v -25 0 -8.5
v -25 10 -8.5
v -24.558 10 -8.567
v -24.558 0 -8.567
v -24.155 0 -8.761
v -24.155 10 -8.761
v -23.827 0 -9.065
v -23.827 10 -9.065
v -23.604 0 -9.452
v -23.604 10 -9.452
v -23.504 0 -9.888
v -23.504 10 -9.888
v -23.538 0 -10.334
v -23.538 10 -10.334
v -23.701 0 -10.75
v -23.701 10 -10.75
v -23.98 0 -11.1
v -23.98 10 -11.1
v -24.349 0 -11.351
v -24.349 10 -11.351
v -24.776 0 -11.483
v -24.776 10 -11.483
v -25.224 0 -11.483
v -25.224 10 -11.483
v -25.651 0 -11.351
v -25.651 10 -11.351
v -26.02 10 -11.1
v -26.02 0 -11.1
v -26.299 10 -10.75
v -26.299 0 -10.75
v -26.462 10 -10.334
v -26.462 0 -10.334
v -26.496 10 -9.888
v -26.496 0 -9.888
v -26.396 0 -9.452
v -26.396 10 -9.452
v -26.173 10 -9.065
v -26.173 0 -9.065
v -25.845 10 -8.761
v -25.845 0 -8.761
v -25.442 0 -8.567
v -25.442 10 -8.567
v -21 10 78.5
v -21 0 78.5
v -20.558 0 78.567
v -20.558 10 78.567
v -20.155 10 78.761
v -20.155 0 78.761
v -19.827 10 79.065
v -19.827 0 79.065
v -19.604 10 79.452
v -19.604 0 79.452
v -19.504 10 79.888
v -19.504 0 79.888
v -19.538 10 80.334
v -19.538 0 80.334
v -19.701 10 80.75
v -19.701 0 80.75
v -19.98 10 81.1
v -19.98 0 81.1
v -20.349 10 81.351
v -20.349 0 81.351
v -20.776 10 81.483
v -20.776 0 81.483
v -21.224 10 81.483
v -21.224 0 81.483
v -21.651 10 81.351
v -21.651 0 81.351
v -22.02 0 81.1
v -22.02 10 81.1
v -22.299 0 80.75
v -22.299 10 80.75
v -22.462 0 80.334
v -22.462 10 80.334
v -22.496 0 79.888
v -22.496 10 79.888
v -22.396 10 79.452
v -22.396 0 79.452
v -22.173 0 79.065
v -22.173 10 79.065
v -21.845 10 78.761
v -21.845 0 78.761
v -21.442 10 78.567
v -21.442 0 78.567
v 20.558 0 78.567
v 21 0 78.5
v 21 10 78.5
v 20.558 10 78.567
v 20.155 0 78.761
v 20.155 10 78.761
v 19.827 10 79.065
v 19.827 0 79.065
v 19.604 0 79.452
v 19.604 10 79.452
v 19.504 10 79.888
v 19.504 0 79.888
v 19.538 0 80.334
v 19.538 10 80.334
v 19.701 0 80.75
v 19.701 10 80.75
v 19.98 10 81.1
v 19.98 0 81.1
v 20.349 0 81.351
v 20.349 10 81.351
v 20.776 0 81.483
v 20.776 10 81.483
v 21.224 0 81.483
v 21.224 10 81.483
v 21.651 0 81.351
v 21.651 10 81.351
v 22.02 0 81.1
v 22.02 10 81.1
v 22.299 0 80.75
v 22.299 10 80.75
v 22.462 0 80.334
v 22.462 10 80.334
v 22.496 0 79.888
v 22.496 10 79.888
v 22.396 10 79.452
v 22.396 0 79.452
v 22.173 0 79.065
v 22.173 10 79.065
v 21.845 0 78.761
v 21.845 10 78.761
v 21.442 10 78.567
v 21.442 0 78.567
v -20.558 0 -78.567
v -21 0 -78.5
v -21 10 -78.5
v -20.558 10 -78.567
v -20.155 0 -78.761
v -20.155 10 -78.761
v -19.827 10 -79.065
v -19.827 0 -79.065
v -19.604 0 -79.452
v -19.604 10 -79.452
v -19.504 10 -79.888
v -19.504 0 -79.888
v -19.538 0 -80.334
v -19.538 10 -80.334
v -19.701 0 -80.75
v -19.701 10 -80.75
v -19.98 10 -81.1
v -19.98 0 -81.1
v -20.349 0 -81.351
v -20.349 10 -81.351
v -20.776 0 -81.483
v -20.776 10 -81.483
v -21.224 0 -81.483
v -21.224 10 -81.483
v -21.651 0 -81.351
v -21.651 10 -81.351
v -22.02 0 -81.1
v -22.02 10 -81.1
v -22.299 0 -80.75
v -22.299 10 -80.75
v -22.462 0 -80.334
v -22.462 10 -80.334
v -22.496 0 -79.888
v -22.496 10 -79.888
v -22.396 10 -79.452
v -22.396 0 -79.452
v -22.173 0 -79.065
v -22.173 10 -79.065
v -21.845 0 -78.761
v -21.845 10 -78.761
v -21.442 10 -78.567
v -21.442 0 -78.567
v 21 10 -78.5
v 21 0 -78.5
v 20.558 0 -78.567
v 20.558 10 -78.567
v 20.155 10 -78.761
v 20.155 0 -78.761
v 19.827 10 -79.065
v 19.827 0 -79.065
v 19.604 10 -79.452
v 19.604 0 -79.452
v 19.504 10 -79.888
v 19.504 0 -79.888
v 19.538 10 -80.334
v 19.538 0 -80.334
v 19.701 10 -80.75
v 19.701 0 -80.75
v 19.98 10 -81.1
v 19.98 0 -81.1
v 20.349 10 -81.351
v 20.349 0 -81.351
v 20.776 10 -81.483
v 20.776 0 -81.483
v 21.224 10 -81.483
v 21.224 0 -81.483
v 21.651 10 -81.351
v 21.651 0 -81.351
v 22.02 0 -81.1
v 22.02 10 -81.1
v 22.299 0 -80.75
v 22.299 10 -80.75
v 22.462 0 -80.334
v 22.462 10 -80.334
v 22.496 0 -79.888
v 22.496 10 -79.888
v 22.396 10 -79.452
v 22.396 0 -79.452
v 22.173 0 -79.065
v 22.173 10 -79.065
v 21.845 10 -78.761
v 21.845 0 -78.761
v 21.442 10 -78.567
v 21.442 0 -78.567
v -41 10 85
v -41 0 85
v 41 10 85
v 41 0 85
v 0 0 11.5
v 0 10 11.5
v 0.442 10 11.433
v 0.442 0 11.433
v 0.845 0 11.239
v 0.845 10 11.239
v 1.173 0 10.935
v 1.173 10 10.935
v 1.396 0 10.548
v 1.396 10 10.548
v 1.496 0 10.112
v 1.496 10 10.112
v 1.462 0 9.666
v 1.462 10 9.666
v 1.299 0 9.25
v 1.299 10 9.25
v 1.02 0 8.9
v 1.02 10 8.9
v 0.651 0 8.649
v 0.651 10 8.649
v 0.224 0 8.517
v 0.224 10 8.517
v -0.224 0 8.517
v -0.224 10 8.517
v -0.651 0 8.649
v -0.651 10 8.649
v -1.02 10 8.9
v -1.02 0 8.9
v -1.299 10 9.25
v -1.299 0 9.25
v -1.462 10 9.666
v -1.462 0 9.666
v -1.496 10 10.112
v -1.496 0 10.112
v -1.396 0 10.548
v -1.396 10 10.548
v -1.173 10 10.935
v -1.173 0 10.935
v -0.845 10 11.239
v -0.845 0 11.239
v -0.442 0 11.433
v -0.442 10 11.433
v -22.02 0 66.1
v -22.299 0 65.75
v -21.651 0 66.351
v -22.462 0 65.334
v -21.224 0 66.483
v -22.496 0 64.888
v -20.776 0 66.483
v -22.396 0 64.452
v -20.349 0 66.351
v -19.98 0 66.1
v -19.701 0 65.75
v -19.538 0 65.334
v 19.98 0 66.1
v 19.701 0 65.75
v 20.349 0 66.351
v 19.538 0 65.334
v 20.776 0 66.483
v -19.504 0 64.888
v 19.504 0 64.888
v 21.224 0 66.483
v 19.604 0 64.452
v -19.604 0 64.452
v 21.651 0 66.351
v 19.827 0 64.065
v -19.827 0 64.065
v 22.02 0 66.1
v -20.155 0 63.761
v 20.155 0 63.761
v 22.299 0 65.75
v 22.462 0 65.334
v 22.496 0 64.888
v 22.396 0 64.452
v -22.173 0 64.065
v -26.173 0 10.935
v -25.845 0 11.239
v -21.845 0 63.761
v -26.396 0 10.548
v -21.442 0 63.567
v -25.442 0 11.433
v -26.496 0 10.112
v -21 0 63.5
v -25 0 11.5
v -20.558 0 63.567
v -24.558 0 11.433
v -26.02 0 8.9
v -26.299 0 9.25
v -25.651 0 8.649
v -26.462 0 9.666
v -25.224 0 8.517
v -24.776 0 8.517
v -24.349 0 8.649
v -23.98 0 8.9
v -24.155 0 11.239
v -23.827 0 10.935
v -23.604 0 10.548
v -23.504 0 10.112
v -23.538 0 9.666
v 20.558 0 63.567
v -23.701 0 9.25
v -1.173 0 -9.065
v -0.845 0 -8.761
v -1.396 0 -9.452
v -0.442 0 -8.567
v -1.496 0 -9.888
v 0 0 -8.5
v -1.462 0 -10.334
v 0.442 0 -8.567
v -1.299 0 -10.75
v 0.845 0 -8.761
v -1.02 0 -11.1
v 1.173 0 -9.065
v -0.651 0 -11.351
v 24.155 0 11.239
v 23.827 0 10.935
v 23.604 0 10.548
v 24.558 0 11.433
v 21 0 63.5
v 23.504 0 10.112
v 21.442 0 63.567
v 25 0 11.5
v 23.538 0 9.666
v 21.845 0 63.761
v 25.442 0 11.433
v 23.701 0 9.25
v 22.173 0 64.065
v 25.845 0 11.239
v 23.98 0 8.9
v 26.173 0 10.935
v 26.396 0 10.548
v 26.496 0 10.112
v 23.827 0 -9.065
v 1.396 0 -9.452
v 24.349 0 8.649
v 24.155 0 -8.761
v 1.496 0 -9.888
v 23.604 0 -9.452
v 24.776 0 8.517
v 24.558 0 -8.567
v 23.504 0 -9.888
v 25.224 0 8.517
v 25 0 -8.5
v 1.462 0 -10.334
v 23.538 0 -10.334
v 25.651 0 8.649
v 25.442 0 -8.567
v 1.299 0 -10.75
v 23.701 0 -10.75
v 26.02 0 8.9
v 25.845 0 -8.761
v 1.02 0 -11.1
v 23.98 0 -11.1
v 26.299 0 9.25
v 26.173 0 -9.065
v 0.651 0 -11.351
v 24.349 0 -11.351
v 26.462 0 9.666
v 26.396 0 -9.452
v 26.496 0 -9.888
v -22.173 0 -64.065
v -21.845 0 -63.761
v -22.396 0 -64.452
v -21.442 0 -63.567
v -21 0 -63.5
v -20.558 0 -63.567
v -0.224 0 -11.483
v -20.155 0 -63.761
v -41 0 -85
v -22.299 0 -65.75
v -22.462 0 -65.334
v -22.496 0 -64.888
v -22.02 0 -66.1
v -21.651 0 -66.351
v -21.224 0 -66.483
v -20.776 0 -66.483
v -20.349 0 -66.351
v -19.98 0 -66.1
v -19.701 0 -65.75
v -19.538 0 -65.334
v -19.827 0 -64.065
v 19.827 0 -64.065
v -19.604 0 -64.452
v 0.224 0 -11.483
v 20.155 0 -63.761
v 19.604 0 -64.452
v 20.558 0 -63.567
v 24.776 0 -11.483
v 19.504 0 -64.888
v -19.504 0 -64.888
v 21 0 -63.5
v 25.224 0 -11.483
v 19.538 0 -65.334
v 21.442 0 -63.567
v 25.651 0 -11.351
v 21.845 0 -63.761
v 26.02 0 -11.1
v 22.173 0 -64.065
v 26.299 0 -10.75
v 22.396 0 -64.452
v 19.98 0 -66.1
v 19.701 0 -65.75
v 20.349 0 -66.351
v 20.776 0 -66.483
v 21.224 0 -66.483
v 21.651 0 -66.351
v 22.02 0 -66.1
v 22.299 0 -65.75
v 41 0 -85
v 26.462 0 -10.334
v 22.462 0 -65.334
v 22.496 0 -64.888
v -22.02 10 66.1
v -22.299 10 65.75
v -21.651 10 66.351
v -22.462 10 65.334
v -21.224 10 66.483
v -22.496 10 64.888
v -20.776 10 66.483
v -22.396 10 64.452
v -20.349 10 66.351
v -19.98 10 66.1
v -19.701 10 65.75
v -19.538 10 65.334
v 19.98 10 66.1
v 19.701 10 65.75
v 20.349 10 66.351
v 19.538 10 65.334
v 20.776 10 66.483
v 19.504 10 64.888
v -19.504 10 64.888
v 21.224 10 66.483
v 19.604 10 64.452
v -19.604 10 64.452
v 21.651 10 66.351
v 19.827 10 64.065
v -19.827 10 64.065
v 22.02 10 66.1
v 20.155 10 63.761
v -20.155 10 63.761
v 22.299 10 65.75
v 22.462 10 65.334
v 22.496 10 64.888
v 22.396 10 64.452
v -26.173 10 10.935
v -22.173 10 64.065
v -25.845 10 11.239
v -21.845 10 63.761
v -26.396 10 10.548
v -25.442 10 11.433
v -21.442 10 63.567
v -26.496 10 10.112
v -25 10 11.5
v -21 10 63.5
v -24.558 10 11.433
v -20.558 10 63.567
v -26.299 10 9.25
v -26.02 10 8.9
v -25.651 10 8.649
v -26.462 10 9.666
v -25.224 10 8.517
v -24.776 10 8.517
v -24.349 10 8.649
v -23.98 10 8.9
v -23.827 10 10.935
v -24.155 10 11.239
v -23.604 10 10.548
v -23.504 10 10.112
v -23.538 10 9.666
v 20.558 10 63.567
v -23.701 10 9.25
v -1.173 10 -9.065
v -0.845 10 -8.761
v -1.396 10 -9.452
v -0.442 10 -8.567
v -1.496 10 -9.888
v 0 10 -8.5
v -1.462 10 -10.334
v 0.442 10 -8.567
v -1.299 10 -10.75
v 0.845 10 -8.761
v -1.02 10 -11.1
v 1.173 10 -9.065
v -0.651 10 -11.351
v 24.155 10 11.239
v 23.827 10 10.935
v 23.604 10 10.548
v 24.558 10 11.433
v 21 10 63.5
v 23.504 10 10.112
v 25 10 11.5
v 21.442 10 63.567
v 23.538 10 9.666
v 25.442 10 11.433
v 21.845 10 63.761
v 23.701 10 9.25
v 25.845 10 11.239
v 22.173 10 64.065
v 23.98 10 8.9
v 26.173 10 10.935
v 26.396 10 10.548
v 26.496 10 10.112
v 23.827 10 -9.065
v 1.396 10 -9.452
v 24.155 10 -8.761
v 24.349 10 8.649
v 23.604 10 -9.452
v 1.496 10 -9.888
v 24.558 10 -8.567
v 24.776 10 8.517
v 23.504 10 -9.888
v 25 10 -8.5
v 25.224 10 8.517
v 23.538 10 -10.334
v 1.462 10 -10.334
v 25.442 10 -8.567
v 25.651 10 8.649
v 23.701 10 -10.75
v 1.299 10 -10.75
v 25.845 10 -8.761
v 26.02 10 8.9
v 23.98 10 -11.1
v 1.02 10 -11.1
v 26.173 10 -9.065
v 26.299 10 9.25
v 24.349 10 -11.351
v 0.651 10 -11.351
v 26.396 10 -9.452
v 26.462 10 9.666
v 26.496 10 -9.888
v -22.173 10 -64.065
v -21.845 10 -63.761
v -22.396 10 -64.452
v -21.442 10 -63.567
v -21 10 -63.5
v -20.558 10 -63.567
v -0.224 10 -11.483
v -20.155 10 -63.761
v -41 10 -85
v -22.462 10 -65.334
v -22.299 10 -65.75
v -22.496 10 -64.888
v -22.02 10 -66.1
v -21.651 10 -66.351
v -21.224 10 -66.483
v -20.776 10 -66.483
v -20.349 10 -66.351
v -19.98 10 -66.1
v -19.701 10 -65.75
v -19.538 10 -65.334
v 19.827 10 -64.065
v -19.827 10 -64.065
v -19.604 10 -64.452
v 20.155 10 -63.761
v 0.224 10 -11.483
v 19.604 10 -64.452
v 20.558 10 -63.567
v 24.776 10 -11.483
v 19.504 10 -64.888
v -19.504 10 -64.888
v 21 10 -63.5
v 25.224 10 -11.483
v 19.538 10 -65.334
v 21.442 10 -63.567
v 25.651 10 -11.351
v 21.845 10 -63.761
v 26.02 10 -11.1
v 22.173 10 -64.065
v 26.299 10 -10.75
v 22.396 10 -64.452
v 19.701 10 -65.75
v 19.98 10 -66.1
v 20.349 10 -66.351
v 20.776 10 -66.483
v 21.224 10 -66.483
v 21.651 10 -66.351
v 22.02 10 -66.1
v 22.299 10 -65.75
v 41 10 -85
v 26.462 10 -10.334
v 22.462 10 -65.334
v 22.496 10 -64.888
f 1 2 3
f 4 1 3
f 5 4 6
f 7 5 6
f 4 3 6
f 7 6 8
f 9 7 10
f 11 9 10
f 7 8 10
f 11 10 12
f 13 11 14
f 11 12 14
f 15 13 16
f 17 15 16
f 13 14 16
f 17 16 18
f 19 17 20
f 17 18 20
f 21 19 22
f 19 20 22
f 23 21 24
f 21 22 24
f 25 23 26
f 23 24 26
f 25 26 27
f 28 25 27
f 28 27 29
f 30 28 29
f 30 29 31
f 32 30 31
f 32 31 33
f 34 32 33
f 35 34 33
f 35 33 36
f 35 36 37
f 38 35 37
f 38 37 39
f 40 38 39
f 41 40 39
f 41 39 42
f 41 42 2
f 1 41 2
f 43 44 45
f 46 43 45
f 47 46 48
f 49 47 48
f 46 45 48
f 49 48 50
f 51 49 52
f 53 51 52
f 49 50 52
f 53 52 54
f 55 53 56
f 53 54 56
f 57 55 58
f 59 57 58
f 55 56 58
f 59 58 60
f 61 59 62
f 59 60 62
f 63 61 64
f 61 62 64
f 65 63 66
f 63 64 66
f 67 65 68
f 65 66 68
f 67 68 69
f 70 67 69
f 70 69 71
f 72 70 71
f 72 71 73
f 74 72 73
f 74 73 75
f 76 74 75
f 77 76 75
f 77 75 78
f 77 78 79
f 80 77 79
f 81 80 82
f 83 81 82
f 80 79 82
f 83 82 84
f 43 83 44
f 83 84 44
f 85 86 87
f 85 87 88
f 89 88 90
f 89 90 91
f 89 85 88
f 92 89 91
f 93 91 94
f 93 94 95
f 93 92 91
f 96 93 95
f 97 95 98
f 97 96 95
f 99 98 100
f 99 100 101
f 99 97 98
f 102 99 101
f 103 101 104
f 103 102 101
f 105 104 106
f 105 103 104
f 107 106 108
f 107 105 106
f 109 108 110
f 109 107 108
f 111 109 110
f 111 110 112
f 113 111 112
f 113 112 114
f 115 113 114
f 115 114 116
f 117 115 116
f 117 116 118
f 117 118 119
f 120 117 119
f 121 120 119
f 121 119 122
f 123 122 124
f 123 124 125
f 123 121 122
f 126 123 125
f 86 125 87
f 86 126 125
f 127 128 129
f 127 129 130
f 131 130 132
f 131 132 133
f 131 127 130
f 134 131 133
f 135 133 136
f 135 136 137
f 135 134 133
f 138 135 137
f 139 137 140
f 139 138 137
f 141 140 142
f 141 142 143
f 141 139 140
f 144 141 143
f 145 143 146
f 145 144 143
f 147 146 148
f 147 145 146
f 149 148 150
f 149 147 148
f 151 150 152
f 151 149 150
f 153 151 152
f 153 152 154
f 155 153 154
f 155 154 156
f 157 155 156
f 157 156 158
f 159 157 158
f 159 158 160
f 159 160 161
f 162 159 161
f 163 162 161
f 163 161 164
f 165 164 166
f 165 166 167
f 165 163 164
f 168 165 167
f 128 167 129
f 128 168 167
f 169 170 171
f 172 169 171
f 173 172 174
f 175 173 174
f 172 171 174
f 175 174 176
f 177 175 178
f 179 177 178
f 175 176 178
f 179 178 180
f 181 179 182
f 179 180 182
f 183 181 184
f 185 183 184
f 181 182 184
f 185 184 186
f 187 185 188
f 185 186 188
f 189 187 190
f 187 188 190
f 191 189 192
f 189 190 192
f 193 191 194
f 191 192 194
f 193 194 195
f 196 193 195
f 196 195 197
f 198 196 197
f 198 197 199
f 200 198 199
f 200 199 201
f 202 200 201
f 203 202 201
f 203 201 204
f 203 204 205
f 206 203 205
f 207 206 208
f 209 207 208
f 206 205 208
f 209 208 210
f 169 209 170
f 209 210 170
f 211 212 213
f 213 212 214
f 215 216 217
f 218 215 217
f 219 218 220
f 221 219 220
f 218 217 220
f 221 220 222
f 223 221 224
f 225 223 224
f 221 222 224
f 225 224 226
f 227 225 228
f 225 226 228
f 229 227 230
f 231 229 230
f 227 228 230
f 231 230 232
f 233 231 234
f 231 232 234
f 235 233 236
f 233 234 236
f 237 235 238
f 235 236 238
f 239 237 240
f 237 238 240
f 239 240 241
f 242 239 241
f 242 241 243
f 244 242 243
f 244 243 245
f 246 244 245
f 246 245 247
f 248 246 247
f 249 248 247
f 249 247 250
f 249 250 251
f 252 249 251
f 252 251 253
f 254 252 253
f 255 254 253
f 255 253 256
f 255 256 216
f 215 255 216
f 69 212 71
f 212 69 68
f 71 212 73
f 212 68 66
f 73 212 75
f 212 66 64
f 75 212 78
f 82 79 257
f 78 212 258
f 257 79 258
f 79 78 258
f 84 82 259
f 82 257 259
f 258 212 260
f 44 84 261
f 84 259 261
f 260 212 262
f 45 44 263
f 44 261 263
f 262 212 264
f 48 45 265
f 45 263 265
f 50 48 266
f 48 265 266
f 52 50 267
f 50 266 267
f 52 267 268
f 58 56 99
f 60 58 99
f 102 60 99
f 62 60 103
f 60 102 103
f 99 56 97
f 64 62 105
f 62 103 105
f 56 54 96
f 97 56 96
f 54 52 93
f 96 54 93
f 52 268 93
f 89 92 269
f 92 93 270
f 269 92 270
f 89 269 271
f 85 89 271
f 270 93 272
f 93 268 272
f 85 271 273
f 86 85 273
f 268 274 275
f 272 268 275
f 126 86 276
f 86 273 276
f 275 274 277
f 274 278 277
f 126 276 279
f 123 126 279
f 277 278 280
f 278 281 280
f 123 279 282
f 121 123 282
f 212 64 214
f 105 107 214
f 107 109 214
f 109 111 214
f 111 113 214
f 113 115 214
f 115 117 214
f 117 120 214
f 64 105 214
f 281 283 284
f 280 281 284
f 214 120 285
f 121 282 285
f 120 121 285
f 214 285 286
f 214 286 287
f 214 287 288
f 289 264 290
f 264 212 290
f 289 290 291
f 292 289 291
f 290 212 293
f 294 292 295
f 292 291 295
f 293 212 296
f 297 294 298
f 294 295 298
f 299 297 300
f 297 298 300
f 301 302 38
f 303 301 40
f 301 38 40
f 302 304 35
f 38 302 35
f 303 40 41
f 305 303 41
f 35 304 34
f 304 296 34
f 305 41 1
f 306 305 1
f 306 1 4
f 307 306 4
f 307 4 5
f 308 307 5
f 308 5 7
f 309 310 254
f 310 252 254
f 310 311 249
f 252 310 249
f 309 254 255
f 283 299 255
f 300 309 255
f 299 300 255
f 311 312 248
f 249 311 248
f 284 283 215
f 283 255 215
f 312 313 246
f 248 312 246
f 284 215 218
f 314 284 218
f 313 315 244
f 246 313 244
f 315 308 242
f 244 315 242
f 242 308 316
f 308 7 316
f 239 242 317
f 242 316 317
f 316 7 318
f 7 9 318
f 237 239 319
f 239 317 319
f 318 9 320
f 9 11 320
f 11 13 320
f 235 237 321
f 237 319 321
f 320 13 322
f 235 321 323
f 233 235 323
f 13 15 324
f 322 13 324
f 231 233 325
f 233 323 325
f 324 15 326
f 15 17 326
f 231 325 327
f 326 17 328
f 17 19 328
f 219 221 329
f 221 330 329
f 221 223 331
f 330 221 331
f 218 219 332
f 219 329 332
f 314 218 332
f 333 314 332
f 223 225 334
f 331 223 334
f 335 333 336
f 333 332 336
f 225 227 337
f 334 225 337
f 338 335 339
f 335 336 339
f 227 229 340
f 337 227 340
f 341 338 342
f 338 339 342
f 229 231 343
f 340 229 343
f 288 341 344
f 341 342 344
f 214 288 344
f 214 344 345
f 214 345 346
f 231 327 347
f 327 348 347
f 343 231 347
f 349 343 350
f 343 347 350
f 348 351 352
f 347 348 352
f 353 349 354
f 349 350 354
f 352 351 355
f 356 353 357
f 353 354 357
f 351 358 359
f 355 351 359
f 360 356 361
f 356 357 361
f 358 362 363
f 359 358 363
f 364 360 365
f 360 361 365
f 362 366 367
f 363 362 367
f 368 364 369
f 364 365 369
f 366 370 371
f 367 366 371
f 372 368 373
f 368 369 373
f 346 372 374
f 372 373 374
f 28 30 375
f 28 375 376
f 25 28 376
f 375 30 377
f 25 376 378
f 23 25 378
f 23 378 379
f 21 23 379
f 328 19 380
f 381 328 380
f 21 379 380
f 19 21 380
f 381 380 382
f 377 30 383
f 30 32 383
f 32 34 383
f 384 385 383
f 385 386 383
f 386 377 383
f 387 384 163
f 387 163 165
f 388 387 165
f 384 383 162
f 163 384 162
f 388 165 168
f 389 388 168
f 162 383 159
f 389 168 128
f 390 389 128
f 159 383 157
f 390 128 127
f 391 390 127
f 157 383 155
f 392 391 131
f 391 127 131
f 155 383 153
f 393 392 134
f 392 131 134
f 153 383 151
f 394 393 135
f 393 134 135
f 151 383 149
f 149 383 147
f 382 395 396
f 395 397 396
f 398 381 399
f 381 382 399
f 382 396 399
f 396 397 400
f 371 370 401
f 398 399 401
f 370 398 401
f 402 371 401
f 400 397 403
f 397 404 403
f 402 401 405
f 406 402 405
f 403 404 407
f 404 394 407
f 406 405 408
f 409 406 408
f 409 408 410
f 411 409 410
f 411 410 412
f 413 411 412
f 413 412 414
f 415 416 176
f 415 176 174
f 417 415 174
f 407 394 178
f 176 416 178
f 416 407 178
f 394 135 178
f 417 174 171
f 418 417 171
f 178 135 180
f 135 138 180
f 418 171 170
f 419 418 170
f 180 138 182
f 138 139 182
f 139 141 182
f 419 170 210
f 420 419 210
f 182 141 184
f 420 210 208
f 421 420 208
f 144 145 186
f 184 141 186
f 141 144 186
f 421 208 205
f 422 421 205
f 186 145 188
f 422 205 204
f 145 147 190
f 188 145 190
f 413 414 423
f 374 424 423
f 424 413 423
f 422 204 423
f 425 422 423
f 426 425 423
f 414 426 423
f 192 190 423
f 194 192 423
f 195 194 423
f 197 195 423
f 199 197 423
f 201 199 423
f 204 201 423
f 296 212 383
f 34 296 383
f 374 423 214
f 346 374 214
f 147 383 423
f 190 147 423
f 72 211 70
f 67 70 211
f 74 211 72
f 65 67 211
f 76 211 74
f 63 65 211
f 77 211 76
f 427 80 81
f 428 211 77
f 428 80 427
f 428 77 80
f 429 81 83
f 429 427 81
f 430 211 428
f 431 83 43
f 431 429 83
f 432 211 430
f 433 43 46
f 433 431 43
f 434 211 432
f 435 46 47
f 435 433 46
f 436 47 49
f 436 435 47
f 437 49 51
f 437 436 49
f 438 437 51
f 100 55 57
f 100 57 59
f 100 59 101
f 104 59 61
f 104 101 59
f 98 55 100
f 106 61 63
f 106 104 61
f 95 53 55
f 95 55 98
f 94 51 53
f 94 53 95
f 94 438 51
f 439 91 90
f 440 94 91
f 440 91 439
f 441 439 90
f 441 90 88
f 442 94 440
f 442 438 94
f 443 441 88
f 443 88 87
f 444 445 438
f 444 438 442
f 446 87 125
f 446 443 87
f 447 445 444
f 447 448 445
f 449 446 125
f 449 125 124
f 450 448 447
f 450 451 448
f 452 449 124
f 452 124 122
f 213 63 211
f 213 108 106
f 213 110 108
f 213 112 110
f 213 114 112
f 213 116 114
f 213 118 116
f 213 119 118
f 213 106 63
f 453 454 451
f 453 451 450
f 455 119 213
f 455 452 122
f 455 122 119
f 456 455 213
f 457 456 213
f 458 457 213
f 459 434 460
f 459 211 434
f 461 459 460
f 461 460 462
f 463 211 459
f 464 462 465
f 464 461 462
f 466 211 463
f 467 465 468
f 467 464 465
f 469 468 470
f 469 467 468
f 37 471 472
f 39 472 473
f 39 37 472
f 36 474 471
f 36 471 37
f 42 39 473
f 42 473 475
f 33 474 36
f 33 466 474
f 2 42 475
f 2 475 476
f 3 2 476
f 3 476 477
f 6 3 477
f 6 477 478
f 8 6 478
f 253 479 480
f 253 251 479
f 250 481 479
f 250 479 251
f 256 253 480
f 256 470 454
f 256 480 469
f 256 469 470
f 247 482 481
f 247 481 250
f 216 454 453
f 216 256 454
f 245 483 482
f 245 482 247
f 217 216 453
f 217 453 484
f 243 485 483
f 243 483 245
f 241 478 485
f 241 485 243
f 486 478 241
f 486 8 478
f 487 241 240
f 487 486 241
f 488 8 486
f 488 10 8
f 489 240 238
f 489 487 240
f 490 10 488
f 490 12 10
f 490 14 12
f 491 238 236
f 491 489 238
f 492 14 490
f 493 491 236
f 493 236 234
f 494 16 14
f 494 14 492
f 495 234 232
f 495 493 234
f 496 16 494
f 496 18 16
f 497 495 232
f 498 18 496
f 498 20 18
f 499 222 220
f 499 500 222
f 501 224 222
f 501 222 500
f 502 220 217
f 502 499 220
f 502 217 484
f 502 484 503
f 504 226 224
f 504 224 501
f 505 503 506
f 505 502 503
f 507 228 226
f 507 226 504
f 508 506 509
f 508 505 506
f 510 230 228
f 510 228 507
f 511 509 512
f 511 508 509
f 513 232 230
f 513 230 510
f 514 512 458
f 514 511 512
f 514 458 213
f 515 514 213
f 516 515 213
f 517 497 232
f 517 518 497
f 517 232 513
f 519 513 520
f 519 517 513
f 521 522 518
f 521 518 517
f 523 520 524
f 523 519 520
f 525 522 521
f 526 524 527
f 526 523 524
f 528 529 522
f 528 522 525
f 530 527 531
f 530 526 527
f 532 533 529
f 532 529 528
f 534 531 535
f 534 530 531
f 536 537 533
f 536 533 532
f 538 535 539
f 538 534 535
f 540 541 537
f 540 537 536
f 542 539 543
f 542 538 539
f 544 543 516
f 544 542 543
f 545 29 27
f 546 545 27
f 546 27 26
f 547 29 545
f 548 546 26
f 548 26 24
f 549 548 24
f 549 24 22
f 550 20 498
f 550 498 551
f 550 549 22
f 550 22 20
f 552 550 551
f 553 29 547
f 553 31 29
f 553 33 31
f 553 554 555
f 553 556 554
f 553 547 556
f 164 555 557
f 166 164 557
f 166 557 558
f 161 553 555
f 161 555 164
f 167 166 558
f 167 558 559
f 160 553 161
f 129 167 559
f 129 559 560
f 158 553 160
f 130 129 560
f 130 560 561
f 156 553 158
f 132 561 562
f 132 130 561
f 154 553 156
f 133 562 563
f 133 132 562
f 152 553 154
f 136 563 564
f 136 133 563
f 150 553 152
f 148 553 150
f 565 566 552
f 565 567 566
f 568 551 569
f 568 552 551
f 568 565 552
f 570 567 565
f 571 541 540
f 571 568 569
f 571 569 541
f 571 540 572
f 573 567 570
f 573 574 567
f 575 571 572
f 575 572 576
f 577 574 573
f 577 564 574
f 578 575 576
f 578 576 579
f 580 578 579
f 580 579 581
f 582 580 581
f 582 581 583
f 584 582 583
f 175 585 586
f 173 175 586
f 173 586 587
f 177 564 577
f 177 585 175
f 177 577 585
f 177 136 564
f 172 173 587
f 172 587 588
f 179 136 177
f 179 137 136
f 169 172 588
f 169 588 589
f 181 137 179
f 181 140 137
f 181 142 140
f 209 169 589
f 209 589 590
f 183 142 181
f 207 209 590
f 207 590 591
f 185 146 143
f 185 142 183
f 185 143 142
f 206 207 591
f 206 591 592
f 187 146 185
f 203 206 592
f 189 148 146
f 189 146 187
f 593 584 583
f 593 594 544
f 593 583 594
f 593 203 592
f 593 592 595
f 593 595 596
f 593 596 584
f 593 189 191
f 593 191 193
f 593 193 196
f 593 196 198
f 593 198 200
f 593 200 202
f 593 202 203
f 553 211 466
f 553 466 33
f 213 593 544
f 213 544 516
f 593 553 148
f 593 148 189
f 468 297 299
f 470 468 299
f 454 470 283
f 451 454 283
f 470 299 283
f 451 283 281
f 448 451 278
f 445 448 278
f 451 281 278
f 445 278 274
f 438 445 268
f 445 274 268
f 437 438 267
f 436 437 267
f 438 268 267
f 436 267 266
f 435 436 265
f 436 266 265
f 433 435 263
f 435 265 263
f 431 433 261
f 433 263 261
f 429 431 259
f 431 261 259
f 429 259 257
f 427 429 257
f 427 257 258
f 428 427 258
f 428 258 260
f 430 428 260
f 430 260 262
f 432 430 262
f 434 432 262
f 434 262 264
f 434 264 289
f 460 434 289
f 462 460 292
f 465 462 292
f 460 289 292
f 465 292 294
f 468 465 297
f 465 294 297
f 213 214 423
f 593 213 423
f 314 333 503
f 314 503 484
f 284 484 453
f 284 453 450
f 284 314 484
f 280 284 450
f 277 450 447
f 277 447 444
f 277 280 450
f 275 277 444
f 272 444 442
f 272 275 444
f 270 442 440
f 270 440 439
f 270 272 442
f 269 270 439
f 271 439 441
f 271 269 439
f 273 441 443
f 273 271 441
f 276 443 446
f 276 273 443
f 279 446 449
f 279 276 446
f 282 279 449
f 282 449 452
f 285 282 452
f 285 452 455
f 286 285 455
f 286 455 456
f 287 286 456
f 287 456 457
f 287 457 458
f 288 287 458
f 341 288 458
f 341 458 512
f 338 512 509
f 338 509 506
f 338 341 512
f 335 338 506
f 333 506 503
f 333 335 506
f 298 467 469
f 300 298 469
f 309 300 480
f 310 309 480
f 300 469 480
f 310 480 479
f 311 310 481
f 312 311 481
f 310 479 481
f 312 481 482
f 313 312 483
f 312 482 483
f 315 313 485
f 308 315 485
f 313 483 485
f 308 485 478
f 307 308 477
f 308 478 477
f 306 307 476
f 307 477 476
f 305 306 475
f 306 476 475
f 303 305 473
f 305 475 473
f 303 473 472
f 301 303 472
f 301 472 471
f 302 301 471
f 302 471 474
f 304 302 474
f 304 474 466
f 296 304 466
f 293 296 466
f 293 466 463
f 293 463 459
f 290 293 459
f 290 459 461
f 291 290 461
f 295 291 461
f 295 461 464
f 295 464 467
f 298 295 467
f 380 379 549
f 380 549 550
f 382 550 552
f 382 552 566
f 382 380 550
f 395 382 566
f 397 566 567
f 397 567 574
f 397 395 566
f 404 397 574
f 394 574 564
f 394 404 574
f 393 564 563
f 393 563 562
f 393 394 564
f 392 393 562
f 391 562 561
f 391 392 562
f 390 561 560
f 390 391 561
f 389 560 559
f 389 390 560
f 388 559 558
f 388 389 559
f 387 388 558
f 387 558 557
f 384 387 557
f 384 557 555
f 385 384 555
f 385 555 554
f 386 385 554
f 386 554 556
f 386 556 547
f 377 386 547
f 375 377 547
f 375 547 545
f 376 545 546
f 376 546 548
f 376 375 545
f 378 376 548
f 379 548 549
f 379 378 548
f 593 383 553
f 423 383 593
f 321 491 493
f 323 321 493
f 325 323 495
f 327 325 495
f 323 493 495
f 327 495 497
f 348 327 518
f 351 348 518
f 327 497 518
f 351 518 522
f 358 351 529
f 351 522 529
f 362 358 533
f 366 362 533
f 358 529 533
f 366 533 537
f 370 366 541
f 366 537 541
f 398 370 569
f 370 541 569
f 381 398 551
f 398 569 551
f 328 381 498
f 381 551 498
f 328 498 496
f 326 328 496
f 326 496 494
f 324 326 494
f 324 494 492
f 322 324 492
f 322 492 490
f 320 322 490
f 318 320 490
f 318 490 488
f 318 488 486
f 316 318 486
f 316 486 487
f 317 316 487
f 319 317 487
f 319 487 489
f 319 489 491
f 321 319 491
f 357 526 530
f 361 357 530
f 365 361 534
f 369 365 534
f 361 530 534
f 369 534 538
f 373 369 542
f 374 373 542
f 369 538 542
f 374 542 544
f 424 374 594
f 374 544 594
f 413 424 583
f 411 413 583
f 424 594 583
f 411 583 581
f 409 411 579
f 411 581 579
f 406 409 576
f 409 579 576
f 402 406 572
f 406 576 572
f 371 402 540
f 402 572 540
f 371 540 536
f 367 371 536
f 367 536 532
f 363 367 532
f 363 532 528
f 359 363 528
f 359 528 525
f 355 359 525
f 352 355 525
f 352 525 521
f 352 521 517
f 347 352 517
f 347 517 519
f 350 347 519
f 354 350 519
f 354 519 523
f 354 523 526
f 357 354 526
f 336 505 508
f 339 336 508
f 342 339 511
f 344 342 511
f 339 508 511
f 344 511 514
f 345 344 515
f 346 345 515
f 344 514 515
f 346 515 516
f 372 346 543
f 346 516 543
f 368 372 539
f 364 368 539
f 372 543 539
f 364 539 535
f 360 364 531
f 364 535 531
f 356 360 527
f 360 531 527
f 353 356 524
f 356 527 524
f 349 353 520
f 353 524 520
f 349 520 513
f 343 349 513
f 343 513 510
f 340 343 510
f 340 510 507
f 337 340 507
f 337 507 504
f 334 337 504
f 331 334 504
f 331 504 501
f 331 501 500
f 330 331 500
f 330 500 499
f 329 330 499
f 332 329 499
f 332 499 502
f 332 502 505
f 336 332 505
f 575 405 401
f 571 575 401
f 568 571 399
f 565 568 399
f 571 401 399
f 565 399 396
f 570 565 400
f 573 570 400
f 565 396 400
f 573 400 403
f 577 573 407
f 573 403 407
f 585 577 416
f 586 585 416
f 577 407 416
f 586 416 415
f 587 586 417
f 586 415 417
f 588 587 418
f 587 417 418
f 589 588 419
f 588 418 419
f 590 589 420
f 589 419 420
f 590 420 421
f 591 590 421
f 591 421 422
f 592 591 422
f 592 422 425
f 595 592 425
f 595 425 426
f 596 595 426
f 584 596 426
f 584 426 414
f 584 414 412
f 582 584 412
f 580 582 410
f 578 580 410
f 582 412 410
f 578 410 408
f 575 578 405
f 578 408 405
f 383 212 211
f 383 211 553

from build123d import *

# Parameters (mm, degrees)
SKETCH_1_W               = 82
SKETCH_1_H               = 170
EXTRUDE_1_DEPTH          = 10
SKETCH_2_R               = 1.5
CUT_EXTRUDE_1_DEPTH      = 95.899947313
SKETCH_3_R               = 1.5
CUT_EXTRUDE_2_DEPTH      = 10
MIRROR_2_COPY_1_SKETCH_R = 1.5
MIRROR_2_COPY_1_DEPTH    = 10


with BuildPart() as part:
    # 草图1 → 凸台-拉伸1 (new body)
    with BuildSketch(Plane(origin=(0, 0, 0), x_dir=(1, 0, 0), z_dir=(0, 1, 0))):
        Rectangle(SKETCH_1_W, SKETCH_1_H)
    extrude(amount=EXTRUDE_1_DEPTH)

    # 草图2 → 切除-拉伸1 (cut, through all)
    with BuildSketch(Plane(origin=(0, 10, 0), x_dir=(1, 0, 0), z_dir=(0, 1, 0))):
        with Locations(Location((-25, 10, 0), (0, 0, 270))):
            Circle(SKETCH_2_R)
        with Locations(Location((0, 10, 0), (0, 0, 270))):
            Circle(SKETCH_2_R)
        with Locations(Location((25, 10, 0), (0, 0, 270))):
            Circle(SKETCH_2_R)
        with Locations(Location((-25, -10, 0), (0, 0, 270))):
            Circle(SKETCH_2_R)
        with Locations(Location((0, -10, 0), (0, 0, 270))):
            Circle(SKETCH_2_R)
        with Locations(Location((25, -10, 0), (0, 0, 270))):
            Circle(SKETCH_2_R)
    extrude(amount=-CUT_EXTRUDE_1_DEPTH, mode=Mode.SUBTRACT)

    # 草图3 → 切除-拉伸2 (cut)
    with BuildSketch(Plane.XZ):
        with Locations(Location((-21, 80, 0), (0, 0, 270))):
            Circle(SKETCH_3_R)
        with Locations(Location((-21, 65, 0), (0, 0, 270))):
            Circle(SKETCH_3_R)
    cut_extrude_2 = extrude(amount=-CUT_EXTRUDE_2_DEPTH, mode=Mode.SUBTRACT)

    # 镜向1: 切除-拉伸2 across plane
    add(cut_extrude_2.mirror(Plane.XY), mode=Mode.SUBTRACT)

    # 镜向2: 切除-拉伸2 across plane
    add(cut_extrude_2.mirror(Plane(origin=(0, 0, 0), x_dir=(0, 0, 1), z_dir=(1, 0, 0))), mode=Mode.SUBTRACT)

    # 镜向2 copy 1 sketch → 镜向2 copy 1 (cut)
    with BuildSketch(Plane(origin=(0, 0, 0), x_dir=(-1, 0, 0), z_dir=(0, -1, 0))):
        with Locations(Location((-21, 80, 0), (0, 0, 270))):
            Circle(MIRROR_2_COPY_1_SKETCH_R)
        with Locations(Location((-21, 65, 0), (0, 0, 270))):
            Circle(MIRROR_2_COPY_1_SKETCH_R)
    extrude(amount=-MIRROR_2_COPY_1_DEPTH, mode=Mode.SUBTRACT)


solid = part.part
